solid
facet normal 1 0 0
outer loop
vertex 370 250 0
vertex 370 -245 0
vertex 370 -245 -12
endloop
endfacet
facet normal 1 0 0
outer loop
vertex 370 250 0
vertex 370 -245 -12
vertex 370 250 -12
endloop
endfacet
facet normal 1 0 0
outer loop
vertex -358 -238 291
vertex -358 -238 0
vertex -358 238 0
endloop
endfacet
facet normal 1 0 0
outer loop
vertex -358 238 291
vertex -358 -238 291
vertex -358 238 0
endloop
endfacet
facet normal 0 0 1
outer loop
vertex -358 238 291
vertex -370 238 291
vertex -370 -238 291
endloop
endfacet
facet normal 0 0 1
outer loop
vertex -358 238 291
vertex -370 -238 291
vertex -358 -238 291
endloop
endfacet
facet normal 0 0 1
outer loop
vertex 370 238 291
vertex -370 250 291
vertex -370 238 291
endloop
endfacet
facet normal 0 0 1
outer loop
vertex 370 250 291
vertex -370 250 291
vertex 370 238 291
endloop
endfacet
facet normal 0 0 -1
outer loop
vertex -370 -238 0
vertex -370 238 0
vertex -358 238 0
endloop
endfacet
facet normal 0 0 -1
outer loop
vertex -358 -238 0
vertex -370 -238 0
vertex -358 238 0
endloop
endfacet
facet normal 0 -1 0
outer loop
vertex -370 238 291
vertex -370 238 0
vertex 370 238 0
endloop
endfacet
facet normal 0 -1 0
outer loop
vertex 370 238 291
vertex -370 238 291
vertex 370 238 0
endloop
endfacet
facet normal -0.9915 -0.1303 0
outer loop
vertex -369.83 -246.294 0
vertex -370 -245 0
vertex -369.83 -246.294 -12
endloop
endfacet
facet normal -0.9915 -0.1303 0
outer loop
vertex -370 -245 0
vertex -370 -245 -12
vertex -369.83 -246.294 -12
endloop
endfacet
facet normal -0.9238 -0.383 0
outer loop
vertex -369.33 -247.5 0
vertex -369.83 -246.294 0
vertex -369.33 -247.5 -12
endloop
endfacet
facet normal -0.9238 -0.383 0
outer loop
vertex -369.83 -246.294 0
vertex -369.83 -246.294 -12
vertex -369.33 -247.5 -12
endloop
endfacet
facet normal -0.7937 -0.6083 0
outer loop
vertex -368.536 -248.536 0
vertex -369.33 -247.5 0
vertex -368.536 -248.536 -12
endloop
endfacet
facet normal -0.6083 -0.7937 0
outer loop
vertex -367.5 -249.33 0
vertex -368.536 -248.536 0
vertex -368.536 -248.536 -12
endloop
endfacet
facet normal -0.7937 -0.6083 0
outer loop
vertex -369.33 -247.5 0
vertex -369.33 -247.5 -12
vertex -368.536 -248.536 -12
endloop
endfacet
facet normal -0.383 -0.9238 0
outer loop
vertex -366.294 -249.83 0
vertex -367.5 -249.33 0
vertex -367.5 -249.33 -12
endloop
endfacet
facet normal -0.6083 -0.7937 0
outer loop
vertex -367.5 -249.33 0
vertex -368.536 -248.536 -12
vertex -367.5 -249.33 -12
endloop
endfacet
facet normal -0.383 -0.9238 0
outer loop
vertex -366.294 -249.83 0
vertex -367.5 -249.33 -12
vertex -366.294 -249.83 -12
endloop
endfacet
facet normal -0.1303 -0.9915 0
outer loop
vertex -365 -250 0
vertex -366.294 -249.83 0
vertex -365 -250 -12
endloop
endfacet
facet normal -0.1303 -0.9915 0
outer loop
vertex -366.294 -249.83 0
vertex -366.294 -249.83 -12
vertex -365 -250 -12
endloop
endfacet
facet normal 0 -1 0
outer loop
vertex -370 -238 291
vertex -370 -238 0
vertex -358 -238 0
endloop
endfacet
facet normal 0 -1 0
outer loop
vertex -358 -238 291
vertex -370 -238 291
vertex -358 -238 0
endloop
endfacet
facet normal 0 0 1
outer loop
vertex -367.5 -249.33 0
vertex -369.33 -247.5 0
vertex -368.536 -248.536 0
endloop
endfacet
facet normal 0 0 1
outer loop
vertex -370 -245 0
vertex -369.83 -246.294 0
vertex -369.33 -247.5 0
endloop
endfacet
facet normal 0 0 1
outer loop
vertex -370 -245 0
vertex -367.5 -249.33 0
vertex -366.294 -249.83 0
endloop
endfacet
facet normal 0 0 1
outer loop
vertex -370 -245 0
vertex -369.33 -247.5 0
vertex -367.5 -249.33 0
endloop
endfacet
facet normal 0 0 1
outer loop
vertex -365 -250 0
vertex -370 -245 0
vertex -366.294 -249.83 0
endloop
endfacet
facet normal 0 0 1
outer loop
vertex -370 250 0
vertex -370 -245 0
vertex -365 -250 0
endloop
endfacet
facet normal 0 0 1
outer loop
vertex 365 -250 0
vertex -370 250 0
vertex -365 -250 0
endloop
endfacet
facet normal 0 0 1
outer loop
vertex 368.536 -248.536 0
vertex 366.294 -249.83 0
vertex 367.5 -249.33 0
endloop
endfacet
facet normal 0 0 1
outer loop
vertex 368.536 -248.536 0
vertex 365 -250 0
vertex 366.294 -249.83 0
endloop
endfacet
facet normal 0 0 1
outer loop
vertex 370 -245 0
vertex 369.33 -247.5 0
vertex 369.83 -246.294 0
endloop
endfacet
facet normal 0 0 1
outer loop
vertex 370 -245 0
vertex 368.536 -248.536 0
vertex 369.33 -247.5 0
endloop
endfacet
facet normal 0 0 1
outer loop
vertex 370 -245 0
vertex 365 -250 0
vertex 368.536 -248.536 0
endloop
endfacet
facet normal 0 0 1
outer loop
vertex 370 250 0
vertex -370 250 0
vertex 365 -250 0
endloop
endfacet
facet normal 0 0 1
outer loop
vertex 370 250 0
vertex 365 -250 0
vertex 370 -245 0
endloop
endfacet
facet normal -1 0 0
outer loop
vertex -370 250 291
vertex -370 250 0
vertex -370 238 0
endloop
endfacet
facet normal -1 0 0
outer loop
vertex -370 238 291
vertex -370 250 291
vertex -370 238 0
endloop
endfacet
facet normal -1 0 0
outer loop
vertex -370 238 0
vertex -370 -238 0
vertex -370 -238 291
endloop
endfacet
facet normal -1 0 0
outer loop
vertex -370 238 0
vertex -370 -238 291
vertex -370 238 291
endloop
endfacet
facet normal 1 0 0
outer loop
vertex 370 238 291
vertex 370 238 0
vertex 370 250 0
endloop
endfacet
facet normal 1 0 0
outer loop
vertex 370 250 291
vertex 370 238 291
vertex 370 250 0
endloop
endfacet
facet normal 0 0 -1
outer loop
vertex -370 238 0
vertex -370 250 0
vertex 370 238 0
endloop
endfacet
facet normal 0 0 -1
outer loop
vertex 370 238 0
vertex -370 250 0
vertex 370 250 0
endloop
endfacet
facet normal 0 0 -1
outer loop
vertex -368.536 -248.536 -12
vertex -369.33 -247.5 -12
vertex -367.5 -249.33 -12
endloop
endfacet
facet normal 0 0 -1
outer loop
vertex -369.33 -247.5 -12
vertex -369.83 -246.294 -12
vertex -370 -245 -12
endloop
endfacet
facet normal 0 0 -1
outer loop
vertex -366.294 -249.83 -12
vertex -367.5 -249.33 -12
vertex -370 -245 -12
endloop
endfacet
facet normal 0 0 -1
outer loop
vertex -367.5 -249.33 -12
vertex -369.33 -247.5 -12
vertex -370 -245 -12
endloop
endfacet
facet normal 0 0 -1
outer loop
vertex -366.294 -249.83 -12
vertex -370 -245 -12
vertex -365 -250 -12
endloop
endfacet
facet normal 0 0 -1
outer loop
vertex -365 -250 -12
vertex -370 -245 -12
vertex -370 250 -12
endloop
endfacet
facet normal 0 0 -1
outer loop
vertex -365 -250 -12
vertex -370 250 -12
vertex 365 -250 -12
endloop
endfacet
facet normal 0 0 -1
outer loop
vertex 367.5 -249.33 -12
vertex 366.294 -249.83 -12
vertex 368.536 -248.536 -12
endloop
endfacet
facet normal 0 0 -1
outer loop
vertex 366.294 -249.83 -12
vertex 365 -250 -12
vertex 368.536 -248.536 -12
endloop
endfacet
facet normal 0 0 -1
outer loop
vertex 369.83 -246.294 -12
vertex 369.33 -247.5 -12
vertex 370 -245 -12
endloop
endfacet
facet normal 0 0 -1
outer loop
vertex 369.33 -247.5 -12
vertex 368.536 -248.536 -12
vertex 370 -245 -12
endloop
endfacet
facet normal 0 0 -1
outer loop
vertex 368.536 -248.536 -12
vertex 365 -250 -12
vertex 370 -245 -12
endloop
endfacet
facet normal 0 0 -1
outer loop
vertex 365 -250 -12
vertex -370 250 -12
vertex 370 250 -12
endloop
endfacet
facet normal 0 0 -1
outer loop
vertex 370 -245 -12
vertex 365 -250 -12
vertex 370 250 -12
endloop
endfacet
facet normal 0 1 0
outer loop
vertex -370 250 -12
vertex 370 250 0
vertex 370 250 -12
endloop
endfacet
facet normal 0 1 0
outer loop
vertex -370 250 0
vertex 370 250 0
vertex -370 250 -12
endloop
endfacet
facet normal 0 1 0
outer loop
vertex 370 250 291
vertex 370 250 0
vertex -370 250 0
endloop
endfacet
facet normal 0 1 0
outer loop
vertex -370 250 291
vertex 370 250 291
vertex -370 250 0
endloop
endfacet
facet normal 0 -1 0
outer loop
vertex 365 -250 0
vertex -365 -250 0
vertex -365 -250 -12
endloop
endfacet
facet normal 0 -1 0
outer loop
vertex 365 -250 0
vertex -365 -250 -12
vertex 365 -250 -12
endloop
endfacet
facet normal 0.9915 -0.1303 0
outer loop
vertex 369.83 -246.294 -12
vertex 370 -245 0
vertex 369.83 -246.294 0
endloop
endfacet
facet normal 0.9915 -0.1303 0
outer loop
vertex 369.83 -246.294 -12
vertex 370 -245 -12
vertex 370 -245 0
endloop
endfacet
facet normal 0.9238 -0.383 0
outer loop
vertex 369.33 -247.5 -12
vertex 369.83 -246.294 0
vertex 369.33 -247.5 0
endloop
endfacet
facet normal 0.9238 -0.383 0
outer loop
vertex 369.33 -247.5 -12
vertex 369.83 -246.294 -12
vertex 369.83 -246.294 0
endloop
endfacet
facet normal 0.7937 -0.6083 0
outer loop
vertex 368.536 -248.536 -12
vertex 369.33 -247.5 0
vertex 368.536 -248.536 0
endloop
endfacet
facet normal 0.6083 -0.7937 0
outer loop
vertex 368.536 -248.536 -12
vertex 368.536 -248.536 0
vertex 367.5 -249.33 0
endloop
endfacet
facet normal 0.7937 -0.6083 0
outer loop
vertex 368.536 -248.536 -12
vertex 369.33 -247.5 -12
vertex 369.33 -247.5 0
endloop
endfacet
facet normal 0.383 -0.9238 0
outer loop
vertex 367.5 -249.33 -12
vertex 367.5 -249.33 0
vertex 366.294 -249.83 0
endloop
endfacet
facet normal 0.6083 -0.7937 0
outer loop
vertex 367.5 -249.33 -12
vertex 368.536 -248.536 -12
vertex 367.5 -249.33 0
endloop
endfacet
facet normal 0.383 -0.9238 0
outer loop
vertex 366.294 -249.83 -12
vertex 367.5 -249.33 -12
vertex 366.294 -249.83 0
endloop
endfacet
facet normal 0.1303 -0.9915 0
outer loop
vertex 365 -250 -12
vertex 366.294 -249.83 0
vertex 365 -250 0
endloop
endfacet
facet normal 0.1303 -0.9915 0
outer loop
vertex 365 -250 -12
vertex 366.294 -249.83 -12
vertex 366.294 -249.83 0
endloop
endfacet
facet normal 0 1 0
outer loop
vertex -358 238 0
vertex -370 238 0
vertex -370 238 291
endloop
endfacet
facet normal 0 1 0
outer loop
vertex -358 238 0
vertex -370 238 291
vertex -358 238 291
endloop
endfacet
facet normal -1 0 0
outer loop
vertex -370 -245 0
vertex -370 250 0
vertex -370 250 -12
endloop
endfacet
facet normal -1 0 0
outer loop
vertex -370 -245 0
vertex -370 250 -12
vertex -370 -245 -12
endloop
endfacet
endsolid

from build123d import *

# Parameters (mm, degrees)
F0_W     = 12
F0_H     = 488
F0_H_2   = 12
F0_H_3   = 476
F1_DEPTH = 12
F2_DEPTH = 291
F3_DEPTH = 291
F4_R     = 5


with BuildPart() as f1:
    # F0 (on Top) → F1 (new body)
    with BuildSketch(Plane.XY):
        with Locations((364, -6)):
            Rectangle(F0_W, F0_H)
        Polygon((-358, -250), (358, -250), (358, 238), (-358, 238), (-358, -238), align=None)
        Polygon((358, 238), (370, 238), (370, 250), (-370, 250), (-370, 238), (-358, 238), align=None)
        with Locations((-364, -244)):
            Rectangle(F0_W, F0_H_2)
        with Locations((-364, 0)):
            Rectangle(F0_W, F0_H_3)
    extrude(amount=-F1_DEPTH)

    # F4
    f4_edges = [f1.edges().sort_by_distance(p)[0] for p in [
        (370, -250, -6),
        (-370, -250, -6),
    ]]
    fillet(f4_edges, radius=F4_R)


with BuildPart() as f2:
    # F0 (on Top) → F2 (new body)
    with BuildSketch(Plane.XY):
        Polygon((358, 238), (370, 238), (370, 250), (-370, 250), (-370, 238), (-358, 238), align=None)
    extrude(amount=F2_DEPTH)


with BuildPart() as f3:
    # F0 (on Top) → F3 (new body)
    with BuildSketch(Plane.XY):
        with Locations((-364, 0)):
            Rectangle(F0_W, F0_H_3)
    extrude(amount=F3_DEPTH)


solid = Compound([f1.part, f2.part, f3.part])
